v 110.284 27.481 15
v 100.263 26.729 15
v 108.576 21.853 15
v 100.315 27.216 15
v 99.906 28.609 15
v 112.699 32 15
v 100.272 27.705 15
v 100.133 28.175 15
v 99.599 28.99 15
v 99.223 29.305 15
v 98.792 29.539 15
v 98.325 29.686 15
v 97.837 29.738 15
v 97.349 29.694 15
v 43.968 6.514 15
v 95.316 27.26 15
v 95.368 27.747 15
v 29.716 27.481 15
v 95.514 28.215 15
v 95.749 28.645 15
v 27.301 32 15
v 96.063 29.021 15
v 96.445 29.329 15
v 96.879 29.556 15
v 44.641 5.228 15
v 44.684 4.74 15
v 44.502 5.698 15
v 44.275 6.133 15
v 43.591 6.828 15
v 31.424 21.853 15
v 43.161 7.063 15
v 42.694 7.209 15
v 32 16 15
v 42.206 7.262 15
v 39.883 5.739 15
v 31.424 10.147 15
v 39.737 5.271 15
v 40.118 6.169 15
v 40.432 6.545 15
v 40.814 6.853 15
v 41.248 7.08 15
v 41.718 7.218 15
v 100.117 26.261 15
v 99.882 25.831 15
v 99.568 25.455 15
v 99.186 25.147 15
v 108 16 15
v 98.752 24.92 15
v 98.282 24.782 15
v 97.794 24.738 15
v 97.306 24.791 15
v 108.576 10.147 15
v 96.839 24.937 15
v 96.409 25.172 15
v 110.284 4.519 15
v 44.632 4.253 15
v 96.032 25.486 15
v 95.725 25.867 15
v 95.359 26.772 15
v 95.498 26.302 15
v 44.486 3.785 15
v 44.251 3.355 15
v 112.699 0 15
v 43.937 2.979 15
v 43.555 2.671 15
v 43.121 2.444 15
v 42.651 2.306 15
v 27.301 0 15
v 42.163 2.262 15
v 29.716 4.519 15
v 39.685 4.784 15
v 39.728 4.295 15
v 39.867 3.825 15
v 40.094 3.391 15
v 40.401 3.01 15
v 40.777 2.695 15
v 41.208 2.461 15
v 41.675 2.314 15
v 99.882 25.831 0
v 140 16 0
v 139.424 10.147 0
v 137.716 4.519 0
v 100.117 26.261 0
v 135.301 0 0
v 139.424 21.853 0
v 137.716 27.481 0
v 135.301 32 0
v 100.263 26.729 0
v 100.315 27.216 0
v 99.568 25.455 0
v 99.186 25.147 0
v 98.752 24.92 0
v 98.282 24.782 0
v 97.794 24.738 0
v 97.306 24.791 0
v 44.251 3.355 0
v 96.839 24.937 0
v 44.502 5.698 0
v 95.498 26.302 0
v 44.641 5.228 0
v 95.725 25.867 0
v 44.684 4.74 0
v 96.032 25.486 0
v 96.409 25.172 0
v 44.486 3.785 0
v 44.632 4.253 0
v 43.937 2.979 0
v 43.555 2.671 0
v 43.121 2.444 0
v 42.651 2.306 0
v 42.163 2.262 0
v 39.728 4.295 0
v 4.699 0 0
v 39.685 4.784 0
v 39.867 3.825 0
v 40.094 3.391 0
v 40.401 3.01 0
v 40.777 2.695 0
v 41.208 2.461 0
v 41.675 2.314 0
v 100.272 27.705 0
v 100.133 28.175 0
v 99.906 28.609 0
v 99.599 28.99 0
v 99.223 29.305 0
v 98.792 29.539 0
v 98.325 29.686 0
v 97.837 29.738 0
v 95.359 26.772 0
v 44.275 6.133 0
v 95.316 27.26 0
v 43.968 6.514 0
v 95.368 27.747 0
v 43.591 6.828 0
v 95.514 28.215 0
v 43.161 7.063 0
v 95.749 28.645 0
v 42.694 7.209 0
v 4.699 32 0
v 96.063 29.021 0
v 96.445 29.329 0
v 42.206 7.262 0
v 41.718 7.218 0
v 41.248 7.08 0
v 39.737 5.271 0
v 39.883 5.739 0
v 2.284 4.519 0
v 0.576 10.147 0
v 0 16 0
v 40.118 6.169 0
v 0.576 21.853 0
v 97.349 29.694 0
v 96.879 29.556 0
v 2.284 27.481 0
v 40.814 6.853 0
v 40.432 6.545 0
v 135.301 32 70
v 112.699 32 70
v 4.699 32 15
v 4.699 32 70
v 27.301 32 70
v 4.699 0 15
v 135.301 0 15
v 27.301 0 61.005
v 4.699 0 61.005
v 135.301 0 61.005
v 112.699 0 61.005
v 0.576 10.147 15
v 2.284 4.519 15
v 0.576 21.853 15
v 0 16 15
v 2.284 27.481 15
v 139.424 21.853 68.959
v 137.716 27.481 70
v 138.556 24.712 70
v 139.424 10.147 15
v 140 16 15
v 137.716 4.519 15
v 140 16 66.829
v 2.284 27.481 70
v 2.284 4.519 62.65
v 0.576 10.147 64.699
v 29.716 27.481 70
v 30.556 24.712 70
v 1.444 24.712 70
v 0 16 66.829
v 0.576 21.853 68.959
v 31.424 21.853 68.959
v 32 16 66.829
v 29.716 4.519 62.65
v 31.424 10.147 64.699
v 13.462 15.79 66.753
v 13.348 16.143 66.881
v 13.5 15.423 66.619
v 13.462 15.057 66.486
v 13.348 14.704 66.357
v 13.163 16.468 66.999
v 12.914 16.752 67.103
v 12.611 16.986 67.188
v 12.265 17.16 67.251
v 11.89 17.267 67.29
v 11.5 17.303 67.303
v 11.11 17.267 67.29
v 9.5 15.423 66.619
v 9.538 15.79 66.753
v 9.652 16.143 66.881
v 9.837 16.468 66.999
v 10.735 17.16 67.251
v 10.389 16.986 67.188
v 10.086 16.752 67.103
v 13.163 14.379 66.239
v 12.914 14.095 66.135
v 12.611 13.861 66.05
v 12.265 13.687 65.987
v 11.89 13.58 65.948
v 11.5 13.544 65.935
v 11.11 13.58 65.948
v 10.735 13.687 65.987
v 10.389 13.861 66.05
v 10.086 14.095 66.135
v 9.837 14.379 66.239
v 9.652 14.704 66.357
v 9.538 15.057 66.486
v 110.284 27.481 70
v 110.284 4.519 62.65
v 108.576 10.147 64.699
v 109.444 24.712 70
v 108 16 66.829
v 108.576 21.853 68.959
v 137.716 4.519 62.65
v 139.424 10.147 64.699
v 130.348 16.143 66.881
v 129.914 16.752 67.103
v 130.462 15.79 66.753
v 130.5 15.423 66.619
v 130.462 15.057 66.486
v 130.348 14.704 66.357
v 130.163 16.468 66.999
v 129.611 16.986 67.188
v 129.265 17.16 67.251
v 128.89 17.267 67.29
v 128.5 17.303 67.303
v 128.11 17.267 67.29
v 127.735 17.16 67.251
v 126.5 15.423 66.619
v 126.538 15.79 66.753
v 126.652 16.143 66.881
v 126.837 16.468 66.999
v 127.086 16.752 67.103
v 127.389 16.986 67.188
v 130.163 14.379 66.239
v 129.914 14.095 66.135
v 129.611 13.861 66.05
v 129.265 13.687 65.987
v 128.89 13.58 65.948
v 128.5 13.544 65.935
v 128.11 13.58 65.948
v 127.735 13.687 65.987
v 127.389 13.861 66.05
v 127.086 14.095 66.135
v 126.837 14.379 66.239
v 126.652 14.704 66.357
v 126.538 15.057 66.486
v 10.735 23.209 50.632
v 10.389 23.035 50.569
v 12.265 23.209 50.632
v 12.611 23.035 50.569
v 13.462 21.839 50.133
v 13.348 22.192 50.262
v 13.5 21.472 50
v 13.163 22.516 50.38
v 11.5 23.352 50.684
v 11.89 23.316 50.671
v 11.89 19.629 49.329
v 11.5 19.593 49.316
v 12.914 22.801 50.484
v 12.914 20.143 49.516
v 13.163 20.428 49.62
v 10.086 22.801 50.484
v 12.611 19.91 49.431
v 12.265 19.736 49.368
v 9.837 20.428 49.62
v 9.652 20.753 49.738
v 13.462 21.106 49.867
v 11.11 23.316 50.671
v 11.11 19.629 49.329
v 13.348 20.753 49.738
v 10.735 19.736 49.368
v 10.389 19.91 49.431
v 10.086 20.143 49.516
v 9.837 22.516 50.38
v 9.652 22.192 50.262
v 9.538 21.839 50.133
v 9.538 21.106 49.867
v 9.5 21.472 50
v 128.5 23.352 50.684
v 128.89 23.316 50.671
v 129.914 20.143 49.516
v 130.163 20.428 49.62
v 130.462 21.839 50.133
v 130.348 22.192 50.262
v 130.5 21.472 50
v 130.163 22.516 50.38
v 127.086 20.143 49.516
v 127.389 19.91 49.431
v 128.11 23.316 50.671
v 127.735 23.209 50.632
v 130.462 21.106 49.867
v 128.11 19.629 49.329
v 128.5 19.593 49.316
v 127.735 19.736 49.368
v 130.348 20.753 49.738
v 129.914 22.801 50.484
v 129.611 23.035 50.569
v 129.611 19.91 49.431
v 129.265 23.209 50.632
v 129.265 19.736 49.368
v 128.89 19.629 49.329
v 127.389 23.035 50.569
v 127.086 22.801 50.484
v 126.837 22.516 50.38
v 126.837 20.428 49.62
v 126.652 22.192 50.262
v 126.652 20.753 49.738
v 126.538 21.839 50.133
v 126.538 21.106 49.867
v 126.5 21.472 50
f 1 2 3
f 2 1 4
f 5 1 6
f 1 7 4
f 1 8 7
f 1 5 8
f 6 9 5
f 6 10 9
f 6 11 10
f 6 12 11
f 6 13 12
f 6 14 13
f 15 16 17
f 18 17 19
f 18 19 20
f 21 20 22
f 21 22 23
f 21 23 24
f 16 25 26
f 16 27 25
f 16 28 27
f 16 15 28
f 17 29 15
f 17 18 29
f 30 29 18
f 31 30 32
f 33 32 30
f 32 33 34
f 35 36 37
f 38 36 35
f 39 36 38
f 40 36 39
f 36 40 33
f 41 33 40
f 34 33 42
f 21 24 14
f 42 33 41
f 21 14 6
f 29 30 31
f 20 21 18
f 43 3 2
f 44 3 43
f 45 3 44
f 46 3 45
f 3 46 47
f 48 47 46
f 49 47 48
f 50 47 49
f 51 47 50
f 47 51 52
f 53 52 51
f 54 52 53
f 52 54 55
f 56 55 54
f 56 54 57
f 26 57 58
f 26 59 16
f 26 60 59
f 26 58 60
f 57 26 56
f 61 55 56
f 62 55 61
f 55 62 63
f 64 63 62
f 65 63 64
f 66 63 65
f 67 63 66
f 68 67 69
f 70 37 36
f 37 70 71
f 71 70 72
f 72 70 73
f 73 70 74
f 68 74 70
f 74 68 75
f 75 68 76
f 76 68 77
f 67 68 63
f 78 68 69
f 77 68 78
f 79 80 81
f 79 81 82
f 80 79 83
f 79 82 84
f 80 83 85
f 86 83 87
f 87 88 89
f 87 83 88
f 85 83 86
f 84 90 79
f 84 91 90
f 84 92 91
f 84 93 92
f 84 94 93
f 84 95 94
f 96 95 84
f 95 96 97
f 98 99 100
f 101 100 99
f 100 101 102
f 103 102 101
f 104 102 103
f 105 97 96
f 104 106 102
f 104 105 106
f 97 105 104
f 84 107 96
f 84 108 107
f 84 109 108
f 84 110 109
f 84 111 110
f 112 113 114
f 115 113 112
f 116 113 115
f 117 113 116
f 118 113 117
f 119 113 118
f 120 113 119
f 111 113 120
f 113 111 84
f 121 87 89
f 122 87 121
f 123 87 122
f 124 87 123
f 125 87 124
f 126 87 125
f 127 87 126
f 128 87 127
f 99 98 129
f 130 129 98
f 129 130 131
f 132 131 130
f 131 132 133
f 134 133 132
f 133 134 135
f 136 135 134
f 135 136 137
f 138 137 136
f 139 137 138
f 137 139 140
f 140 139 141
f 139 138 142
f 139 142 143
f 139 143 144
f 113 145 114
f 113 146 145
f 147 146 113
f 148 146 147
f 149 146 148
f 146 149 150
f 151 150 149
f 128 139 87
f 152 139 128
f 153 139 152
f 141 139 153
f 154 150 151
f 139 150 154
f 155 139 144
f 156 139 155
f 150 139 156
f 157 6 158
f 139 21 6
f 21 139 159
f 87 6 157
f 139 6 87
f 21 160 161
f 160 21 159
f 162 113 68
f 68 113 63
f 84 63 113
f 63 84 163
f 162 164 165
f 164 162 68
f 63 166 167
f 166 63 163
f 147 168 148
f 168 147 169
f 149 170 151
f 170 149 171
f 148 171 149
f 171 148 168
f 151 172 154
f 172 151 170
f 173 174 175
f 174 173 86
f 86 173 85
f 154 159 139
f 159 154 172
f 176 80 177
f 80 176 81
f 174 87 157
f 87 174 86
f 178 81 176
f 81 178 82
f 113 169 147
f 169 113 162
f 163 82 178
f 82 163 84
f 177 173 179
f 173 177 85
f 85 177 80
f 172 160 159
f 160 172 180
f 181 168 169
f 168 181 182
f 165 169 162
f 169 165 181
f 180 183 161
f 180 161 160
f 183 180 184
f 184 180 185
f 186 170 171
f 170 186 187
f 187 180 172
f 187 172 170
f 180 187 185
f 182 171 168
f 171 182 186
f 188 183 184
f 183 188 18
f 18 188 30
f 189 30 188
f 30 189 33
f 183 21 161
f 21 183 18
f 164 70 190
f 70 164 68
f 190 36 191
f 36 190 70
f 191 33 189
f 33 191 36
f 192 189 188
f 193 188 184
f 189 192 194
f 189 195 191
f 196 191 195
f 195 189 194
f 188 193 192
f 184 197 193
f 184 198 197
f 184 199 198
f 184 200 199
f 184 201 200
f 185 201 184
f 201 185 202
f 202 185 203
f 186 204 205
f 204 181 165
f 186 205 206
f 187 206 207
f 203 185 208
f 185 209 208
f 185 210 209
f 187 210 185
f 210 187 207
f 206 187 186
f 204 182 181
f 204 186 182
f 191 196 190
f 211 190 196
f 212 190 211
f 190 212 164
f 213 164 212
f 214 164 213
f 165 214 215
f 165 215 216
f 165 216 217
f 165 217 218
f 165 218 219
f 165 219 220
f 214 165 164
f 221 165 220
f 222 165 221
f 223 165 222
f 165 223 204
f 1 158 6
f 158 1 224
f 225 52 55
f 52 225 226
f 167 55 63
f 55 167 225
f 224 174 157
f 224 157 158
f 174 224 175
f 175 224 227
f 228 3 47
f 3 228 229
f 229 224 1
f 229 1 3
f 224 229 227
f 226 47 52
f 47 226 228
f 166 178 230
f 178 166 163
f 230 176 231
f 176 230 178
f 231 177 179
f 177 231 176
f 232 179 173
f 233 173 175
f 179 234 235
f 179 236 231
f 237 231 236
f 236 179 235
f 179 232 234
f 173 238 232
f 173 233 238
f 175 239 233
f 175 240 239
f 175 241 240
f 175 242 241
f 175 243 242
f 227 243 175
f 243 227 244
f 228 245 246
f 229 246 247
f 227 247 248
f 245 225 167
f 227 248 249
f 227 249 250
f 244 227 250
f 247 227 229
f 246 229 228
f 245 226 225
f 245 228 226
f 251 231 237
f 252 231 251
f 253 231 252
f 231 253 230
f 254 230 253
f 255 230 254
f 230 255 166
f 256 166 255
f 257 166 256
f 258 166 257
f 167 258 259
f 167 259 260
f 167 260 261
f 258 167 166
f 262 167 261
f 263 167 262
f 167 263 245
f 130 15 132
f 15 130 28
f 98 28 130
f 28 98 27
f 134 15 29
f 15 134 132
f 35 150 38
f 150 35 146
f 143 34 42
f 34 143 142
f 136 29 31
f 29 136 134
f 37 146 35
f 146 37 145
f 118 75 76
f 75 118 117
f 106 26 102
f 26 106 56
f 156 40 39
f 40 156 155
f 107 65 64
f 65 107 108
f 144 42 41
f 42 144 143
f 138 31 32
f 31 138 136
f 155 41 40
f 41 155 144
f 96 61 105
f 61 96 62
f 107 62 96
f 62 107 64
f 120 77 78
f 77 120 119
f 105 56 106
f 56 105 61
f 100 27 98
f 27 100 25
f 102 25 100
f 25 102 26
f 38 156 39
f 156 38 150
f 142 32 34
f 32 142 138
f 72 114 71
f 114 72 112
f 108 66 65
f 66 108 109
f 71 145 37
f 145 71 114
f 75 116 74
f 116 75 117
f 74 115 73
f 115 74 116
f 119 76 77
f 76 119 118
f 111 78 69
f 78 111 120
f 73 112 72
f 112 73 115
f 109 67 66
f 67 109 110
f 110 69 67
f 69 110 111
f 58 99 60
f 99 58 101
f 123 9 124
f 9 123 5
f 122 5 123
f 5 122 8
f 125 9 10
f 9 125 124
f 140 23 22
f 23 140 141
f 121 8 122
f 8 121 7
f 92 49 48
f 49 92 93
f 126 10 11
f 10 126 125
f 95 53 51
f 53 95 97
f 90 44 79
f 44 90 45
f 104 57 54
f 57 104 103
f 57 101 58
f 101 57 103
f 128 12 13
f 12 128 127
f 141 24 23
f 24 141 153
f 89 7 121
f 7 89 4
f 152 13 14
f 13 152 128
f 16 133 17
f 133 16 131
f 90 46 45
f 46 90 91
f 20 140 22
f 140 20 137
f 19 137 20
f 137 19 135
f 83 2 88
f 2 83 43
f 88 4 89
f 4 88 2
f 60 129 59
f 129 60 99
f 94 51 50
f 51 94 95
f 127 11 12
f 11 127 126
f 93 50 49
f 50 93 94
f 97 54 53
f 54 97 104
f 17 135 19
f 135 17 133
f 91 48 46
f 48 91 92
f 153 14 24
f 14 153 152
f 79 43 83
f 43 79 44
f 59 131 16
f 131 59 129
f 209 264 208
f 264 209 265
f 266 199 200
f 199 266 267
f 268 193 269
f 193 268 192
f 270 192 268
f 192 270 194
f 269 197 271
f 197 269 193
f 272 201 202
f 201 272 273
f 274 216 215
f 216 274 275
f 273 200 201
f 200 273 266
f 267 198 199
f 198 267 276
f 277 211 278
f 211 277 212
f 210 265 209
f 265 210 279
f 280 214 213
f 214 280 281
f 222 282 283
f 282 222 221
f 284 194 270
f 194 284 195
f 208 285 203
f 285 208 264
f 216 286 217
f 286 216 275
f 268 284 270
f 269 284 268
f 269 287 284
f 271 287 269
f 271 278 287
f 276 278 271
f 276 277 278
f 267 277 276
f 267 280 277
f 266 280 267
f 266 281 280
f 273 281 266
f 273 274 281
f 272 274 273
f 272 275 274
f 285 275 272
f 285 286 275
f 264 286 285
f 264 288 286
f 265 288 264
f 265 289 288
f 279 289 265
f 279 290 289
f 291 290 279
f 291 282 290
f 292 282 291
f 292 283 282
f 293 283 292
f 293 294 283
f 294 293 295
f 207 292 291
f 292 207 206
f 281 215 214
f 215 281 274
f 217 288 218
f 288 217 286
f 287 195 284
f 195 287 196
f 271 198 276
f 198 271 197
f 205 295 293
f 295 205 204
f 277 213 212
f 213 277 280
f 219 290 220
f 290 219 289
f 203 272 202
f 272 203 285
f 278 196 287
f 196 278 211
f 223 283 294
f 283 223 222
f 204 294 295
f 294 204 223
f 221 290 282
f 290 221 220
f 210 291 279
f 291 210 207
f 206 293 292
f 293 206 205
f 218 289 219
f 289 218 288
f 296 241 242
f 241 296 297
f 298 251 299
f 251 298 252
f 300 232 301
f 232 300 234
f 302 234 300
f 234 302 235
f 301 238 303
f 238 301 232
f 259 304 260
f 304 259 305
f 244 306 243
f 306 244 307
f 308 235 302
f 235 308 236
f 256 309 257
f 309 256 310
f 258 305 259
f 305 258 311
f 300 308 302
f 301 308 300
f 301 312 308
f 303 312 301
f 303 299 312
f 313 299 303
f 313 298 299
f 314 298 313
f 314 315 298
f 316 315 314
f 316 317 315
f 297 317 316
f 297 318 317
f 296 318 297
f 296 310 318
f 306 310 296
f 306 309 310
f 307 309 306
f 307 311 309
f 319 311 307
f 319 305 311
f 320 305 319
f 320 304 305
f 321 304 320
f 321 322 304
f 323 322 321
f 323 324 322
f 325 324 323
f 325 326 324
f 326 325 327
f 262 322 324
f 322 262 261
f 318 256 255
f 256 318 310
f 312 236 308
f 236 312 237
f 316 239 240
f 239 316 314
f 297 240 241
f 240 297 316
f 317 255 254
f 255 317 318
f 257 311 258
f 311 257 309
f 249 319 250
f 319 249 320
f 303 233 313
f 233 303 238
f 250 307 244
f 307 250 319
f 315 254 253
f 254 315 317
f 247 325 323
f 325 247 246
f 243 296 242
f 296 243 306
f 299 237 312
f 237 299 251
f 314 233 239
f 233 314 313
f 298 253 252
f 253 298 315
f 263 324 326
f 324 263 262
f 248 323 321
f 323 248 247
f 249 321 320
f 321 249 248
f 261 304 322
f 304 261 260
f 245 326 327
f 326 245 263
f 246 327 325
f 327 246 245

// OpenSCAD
include <pw_primitives.scad>;

$fn = 32;

width = 32;
length = 140;
height_1 = 15;
height_2 = 70;
base_round_r = 30;
base_hole_sep = 60;
base_hole_diam = 5;
base_hole_ang = 22;
tower_r = 32/2;
top_hole_sep = 117;
top_hole_diam = 4;
top_face_ang = 20;
top_hole_depth = 20;

difference() {
    union() {
        // base
        intersection() {
            cube([length, width, height_1]);
            translate([0, width/2, -0.01]) hull() {
                translate([base_round_r, 0, 0])
                  cylinder(r=base_round_r, h=height_1+0.02);
                translate([length-base_round_r, 0, 0]) 
                  cylinder(r=base_round_r, h=height_1+0.02);
            };
        }
        // lh tower
        translate([tower_r, width/2, 0]) intersection() {
            translate([base_round_r-tower_r, 0, 0]) cylinder(r=base_round_r, h=height_2);
            translate([tower_r-base_round_r, 0, 0]) cylinder(r=base_round_r, h=height_2);
            translate([-tower_r, -width/2, 0]) cube([tower_r*2, width, height_2]);
            translate([-tower_r, -(sin(top_face_ang)*width), 0]) rotate([top_face_ang, 0, 0]) 
              cube([tower_r*2, width*2, height_2-sin(top_face_ang)*width]);
        }
        // rh tower
        translate([length-tower_r, width/2, 0]) intersection() {
            translate([base_round_r-tower_r, 0, 0]) cylinder(r=base_round_r, h=height_2);
            translate([tower_r-base_round_r, 0, 0]) cylinder(r=base_round_r, h=height_2);
            translate([-tower_r, -width/2, 0]) cube([tower_r*2, width, height_2]);
            translate([-tower_r, -(sin(top_face_ang)*width), 0]) rotate([top_face_ang, 0, 0]) 
              cube([tower_r*2, width*2, height_2-sin(top_face_ang)*width]);
        }
    }
    // minus base holes
    translate([length/2, width/2, -0.01]) rotate([0, 0, base_hole_ang]) union() {
        translate([-base_hole_sep/2, 0, 0]) cylinder(d=base_hole_diam, h=height_1+0.02);
        translate([base_hole_sep/2, 0, 0]) cylinder(d=base_hole_diam, h=height_1+0.02);
    }
    // minus top holes
    translate([length/2, (width+sin(top_face_ang)*width)/2, height_2-top_hole_depth]) 
    rotate([top_face_ang, 0, 0]) union() {
        translate([-top_hole_sep/2, 0, 0]) cylinder(d=top_hole_diam, h=top_hole_depth);
        translate([top_hole_sep/2, 0, 0]) cylinder(d=top_hole_diam, h=top_hole_depth);
    }
}
